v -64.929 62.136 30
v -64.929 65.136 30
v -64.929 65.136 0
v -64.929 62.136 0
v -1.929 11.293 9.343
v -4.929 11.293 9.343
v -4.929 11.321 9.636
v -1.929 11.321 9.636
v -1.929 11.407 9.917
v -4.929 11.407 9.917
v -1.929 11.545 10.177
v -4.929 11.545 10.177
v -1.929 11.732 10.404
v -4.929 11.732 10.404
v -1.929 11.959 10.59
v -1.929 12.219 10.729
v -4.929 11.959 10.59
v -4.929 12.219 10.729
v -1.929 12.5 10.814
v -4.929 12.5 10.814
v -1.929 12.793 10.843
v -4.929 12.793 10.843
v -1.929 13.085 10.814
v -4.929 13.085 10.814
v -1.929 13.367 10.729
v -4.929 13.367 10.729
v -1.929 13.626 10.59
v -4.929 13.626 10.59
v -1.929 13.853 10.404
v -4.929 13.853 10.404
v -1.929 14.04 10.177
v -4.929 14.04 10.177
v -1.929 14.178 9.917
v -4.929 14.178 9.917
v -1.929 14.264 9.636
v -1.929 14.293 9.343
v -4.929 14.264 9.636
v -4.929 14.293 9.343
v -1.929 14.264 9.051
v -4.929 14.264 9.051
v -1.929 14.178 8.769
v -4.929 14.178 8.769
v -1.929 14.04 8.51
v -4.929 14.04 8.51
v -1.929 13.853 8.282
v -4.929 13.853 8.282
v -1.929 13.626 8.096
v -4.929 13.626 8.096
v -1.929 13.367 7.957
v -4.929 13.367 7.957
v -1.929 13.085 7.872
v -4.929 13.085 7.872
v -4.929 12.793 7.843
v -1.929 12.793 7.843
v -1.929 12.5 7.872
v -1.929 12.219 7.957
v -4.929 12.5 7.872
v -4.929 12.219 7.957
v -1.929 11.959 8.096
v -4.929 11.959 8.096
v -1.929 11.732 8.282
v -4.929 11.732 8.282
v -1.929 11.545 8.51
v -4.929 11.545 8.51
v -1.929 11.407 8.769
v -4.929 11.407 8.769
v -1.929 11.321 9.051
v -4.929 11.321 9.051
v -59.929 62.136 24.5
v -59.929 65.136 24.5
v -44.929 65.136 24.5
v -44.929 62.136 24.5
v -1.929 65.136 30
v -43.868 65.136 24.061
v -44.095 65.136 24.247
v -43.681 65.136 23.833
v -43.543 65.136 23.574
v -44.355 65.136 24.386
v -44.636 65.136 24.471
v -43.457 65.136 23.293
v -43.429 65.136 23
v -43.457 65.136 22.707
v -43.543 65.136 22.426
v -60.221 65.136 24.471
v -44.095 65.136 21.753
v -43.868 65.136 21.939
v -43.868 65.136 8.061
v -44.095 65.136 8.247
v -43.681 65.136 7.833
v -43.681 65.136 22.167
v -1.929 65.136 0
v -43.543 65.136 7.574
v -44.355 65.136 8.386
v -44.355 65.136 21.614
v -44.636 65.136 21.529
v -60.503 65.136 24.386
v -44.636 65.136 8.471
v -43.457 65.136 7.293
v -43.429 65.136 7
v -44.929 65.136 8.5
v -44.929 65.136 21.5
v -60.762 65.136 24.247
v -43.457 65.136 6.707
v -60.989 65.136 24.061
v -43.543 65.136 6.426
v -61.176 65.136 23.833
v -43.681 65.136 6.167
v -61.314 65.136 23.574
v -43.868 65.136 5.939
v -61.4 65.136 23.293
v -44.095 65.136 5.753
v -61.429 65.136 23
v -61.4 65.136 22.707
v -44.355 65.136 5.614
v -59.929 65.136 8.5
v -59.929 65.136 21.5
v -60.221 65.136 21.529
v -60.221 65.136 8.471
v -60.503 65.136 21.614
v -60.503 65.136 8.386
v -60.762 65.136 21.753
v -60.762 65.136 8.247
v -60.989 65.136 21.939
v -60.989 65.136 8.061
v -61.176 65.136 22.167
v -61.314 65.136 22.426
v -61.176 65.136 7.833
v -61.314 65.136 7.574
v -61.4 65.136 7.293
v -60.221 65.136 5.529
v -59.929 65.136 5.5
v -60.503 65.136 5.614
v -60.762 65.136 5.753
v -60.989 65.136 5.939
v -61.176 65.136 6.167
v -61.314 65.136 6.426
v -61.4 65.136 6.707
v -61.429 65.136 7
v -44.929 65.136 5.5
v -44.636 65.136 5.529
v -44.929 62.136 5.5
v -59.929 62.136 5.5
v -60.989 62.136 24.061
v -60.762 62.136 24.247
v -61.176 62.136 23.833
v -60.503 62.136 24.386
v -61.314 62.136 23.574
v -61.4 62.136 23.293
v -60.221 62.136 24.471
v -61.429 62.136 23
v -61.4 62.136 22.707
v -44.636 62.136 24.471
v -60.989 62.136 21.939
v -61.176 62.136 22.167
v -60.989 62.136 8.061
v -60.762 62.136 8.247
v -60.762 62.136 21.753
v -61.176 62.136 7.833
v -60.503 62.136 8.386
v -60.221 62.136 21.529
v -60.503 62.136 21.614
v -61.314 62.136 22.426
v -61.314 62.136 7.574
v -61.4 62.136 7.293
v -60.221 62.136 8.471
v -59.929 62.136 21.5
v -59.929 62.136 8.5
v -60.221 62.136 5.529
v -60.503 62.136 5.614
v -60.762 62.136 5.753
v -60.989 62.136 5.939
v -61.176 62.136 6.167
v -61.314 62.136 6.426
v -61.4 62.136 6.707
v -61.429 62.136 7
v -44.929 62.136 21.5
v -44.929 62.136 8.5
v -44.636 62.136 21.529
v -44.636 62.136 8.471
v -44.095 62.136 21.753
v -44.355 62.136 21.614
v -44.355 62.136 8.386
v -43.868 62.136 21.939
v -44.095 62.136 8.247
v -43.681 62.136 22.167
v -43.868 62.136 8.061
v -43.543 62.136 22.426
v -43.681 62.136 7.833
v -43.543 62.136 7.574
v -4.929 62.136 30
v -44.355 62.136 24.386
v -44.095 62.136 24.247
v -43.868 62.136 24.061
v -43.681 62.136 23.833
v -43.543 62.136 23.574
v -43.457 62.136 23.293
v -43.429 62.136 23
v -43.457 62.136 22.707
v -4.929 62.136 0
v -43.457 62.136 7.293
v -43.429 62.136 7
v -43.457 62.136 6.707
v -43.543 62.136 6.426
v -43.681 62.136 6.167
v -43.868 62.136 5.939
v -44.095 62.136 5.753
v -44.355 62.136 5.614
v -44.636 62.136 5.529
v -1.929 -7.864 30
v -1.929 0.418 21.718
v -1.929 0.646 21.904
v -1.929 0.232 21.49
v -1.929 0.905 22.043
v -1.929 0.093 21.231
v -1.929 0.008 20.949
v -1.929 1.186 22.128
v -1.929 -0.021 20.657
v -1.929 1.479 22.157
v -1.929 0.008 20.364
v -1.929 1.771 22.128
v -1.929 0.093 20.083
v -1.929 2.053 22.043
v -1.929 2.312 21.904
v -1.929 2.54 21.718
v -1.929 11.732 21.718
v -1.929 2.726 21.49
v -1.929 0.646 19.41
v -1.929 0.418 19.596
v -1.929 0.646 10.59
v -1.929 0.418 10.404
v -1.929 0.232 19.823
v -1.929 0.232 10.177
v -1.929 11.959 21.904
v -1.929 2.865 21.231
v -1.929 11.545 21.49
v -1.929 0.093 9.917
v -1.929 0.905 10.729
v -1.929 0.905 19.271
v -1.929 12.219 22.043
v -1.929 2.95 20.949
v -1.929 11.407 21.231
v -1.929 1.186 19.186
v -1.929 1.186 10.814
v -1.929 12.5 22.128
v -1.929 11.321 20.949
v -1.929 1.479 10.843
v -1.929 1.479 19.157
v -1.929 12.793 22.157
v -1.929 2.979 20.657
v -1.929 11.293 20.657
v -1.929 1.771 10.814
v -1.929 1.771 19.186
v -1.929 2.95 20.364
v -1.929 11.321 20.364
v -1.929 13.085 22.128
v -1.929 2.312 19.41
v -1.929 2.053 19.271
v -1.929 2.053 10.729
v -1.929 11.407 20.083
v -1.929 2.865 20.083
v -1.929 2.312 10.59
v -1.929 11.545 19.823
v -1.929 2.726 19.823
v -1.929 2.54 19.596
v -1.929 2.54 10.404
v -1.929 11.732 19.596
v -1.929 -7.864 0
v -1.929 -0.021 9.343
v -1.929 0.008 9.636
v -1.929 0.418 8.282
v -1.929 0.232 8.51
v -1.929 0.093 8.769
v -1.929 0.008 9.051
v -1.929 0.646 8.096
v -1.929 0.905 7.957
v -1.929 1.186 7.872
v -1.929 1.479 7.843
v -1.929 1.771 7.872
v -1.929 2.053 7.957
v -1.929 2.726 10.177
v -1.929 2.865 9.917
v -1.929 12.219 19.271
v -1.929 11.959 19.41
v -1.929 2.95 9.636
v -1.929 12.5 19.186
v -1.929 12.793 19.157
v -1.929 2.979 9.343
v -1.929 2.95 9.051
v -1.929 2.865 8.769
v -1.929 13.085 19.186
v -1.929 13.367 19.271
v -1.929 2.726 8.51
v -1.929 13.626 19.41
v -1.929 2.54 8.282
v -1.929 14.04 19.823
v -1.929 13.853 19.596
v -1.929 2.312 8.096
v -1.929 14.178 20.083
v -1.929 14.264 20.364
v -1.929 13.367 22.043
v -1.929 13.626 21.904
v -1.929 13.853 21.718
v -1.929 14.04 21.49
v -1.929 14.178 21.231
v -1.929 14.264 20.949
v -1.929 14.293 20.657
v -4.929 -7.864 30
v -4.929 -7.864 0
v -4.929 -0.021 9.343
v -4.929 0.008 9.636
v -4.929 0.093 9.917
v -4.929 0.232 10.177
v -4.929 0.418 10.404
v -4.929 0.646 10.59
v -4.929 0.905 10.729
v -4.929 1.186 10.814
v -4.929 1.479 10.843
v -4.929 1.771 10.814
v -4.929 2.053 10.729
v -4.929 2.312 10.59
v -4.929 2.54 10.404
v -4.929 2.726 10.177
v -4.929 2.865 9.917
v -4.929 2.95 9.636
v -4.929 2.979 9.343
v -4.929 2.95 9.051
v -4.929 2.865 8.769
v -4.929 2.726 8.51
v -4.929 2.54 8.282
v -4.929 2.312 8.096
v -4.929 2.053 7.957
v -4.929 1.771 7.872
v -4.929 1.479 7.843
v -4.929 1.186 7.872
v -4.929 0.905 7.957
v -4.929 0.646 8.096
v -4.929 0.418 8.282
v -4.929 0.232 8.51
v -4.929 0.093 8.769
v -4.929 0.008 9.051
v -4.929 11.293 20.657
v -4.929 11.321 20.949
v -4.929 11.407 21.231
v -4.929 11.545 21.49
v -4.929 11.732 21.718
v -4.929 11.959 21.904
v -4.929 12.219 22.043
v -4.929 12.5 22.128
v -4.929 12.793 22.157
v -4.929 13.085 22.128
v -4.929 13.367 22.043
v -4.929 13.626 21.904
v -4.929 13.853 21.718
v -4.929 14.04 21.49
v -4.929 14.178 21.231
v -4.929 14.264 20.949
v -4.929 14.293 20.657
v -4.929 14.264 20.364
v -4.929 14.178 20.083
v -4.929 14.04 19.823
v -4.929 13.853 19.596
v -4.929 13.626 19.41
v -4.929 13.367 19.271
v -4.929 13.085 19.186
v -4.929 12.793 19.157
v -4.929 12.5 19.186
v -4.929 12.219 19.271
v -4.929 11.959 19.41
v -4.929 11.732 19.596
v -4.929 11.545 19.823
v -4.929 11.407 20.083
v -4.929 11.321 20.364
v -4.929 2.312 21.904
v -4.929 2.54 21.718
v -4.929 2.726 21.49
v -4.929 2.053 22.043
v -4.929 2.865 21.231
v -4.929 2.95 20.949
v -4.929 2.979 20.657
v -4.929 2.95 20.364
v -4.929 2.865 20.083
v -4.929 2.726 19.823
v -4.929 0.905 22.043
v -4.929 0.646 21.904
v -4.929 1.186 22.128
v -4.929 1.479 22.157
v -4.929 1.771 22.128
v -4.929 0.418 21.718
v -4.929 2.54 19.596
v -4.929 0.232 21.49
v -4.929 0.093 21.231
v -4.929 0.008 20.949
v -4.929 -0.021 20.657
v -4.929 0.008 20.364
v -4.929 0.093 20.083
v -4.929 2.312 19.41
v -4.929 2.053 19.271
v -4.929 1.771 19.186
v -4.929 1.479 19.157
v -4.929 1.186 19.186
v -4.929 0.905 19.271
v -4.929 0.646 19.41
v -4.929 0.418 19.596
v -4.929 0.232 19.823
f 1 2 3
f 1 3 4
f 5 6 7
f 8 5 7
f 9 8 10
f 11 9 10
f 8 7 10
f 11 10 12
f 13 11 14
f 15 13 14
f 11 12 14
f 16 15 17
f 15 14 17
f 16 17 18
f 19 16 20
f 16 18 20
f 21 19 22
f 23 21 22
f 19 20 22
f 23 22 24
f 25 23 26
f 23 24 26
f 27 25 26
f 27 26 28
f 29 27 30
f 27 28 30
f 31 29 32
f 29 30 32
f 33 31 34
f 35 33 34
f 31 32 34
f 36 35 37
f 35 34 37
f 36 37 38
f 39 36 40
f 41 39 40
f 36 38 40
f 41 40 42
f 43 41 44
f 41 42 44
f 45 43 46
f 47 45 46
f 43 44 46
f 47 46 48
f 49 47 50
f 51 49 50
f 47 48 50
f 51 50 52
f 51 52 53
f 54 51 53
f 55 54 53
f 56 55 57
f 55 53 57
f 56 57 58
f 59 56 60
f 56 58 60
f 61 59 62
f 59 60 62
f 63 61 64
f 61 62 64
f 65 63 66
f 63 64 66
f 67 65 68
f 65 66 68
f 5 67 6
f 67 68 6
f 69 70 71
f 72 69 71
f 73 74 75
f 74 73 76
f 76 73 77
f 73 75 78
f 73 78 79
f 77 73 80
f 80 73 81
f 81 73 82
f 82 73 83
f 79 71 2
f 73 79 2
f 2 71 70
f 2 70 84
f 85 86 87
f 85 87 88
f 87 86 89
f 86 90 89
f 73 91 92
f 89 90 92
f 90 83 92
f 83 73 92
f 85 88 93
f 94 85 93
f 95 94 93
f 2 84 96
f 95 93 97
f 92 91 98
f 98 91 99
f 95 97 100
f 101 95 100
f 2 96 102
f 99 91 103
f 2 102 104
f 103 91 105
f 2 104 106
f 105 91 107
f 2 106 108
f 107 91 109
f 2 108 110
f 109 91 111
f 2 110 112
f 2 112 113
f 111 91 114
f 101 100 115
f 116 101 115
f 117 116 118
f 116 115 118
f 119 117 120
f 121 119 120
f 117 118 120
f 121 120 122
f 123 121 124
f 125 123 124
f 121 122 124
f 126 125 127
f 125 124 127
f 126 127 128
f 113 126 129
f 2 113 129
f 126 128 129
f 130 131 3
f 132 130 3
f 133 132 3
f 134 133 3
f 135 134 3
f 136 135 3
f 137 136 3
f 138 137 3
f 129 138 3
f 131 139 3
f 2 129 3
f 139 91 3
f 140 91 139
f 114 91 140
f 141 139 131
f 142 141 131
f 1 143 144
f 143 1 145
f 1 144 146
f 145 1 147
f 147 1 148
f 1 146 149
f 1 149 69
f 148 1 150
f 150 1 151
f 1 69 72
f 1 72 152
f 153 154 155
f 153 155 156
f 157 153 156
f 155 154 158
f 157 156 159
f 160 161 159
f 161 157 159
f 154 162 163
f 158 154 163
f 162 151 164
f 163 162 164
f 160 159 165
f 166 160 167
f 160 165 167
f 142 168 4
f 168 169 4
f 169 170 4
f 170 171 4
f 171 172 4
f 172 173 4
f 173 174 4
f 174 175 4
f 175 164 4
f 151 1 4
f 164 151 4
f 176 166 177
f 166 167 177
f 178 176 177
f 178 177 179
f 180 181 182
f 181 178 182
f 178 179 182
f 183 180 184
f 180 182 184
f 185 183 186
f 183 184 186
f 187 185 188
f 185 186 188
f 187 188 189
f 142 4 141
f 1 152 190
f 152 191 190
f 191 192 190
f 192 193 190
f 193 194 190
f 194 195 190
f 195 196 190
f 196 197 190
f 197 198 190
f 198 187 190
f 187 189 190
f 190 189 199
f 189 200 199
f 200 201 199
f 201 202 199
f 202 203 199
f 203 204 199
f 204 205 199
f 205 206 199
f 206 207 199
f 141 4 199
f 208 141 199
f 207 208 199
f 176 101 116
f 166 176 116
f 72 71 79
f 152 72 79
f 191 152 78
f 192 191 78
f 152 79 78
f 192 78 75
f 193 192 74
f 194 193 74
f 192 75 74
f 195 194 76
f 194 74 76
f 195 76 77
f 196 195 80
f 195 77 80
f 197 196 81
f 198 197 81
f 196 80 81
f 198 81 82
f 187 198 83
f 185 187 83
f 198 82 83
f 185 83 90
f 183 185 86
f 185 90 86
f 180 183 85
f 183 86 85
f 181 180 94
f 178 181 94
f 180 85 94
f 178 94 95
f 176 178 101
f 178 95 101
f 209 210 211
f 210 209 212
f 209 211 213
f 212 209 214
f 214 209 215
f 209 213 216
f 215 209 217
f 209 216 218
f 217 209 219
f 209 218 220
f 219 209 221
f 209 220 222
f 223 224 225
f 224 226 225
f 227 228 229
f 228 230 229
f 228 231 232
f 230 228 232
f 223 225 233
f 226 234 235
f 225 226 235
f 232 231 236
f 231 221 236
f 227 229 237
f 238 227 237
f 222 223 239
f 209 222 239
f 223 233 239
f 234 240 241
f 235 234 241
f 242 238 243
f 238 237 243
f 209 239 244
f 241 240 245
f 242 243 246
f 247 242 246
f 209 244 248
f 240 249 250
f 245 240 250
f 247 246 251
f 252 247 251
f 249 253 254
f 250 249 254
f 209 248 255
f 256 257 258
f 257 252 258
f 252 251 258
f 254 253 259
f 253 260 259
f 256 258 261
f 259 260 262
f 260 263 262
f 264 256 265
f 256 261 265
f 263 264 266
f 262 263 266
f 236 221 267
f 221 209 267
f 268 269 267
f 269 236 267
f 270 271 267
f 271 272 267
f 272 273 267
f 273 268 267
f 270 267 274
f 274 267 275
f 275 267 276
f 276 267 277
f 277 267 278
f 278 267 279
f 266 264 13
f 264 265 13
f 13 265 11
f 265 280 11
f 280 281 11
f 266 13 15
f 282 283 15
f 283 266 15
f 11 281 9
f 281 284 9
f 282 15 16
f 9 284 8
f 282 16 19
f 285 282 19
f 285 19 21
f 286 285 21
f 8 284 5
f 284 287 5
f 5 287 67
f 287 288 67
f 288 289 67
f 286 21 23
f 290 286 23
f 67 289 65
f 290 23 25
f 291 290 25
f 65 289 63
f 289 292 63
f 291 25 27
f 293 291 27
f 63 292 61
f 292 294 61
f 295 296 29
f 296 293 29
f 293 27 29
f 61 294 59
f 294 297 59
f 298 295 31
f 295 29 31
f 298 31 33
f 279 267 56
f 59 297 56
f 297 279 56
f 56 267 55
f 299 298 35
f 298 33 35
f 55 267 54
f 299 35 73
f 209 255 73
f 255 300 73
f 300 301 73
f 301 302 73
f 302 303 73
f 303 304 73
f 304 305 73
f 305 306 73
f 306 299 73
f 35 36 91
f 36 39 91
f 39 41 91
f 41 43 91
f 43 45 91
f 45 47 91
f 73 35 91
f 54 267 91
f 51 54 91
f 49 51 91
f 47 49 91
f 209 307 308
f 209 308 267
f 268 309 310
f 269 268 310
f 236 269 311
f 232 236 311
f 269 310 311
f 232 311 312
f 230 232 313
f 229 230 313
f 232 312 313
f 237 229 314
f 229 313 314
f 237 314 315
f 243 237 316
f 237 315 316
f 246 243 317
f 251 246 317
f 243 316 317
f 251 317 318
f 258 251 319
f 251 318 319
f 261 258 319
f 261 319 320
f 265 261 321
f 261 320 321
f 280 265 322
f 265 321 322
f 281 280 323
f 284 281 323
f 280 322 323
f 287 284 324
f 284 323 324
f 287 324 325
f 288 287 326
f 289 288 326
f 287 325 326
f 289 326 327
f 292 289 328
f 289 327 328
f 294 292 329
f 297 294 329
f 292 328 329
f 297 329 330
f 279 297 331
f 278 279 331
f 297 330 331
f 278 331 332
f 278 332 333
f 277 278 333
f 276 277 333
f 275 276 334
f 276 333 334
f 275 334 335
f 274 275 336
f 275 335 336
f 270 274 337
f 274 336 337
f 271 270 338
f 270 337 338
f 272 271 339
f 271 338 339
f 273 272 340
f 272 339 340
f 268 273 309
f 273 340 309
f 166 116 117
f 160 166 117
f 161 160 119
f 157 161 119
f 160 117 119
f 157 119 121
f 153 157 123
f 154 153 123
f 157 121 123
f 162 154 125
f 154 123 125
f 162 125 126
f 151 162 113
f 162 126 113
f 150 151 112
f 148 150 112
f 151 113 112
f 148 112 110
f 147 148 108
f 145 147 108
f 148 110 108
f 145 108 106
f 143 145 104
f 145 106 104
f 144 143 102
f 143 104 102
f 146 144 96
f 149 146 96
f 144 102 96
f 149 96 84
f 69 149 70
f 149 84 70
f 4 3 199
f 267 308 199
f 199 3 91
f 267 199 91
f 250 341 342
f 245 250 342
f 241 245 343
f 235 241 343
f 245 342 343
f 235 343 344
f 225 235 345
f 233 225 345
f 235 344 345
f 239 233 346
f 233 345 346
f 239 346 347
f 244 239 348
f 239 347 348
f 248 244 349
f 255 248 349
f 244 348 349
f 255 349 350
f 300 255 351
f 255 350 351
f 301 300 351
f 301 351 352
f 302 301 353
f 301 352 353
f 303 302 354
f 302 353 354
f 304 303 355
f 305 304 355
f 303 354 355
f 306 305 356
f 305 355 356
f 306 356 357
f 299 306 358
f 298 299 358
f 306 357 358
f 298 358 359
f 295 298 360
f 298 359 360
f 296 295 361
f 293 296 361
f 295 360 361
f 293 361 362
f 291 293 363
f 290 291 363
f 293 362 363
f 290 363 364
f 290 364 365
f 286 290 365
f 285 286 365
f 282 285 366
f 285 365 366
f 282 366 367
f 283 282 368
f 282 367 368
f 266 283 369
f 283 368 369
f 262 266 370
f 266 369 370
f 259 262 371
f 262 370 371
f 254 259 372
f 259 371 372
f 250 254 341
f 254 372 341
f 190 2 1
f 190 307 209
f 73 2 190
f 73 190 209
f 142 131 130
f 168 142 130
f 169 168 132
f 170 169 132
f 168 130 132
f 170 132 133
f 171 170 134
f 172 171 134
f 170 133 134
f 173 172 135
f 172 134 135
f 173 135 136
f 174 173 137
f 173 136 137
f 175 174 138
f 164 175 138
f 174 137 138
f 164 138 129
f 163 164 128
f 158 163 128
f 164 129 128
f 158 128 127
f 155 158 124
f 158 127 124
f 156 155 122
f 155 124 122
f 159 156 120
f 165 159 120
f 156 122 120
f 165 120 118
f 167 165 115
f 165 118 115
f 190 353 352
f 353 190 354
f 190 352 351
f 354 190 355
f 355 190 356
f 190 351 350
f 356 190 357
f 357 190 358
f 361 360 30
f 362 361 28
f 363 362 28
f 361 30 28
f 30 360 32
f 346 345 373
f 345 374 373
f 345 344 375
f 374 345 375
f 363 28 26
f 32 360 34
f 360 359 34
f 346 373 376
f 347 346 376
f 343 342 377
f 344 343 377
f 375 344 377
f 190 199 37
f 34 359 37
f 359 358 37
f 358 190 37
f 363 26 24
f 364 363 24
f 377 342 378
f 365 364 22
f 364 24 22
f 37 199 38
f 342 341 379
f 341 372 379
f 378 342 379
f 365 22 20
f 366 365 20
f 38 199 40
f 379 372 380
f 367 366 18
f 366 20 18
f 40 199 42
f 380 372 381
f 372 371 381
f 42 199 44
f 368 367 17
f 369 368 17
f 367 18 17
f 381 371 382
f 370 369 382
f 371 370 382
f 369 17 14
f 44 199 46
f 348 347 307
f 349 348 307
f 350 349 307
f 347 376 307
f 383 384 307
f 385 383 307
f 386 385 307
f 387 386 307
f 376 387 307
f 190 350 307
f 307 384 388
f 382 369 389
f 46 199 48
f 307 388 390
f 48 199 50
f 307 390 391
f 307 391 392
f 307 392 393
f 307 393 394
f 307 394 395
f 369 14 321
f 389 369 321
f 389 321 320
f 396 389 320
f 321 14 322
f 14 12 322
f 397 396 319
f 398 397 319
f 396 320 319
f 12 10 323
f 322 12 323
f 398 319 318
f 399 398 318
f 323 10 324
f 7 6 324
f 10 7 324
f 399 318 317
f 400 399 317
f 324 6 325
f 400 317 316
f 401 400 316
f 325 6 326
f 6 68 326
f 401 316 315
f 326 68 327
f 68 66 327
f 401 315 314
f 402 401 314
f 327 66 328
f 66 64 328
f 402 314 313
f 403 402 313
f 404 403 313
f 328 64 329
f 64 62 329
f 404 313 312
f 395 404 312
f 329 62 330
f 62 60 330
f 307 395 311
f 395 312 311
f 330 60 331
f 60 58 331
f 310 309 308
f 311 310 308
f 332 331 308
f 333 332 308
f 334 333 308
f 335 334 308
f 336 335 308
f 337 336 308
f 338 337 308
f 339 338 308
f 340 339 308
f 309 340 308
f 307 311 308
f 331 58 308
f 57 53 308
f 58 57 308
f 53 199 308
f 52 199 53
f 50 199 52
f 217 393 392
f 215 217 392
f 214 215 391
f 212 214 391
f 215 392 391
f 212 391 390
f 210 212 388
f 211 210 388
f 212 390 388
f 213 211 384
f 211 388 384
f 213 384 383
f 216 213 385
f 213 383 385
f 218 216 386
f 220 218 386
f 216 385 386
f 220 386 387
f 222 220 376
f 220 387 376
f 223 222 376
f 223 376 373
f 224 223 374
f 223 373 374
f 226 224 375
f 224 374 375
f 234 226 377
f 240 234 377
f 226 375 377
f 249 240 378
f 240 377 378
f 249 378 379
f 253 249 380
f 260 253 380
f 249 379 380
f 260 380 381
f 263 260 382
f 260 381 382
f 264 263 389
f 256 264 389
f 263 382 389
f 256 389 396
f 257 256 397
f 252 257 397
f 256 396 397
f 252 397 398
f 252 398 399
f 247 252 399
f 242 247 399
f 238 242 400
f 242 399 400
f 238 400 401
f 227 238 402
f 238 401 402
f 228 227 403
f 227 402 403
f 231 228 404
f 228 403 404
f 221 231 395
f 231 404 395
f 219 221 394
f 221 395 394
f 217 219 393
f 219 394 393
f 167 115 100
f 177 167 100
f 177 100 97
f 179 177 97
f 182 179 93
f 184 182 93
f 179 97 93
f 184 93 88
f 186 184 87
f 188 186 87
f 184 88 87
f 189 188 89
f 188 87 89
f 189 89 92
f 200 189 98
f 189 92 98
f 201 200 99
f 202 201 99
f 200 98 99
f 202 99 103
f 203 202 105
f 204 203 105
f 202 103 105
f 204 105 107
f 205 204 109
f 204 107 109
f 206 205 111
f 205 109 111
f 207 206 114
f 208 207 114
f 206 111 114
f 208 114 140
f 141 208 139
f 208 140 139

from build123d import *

# Parameters (mm, degrees)
SALIENTE_EXTRUIR1_DEPTH = 30
CORTAR_EXTRUIR1_DEPTH   = 3
CROQUIS3_R              = 1.5
CORTAR_EXTRUIR2_DEPTH   = 3


with BuildPart() as part:
    # Croquis1 → Saliente-Extruir1 (new body)
    with BuildSketch(Plane.XY):
        Polygon((-64.928571429, 65.135714286), (-64.928571429, 62.135714286), (-4.928571429, 62.135714286), (-4.928571429, -7.864285714), (-1.928571429, -7.864285714), (-1.928571429, 65.135714286), align=None)
    extrude(amount=SALIENTE_EXTRUIR1_DEPTH)

    # Croquis2 → Cortar-Extruir1 (cut)
    with BuildSketch(Plane(origin=(0, 65.135714286, 0), x_dir=(1, 0, 0), z_dir=(0, 1, 0))):
        with BuildLine():
            Line((-59.928571429, -24.5), (-44.928571429, -24.5))
            ThreePointArc((-44.928571429, -24.5), (-43.428571429, -23), (-44.928571429, -21.5))
            Line((-44.928571429, -21.5), (-59.928571429, -21.5))
            ThreePointArc((-59.928571429, -21.5), (-61.428571429, -23), (-59.928571429, -24.5))
        make_face()
        with BuildLine():
            Line((-59.928571429, -8.5), (-44.928571429, -8.5))
            ThreePointArc((-44.928571429, -8.5), (-43.428571429, -7), (-44.928571429, -5.5))
            Line((-44.928571429, -5.5), (-59.928571429, -5.5))
            ThreePointArc((-59.928571429, -5.5), (-61.428571429, -7), (-59.928571429, -8.5))
        make_face()
    extrude(amount=-CORTAR_EXTRUIR1_DEPTH, mode=Mode.SUBTRACT)

    # Croquis3 → Cortar-Extruir2 (cut)
    with BuildSketch(Plane.ZY.offset(4.928571429)):
        with Locations(Location((20.656854249, 1.478860036, 0), (0, 0, 270))):
            Circle(CROQUIS3_R)
        with Locations(Location((9.343145751, 1.478860036, 0), (0, 0, 270))):
            Circle(CROQUIS3_R)
        with Locations(Location((9.343145751, 12.792568535, 0), (0, 0, 270))):
            Circle(CROQUIS3_R)
        with Locations(Location((20.656854249, 12.792568535, 0), (0, 0, 270))):
            Circle(CROQUIS3_R)
    extrude(amount=-CORTAR_EXTRUIR2_DEPTH, mode=Mode.SUBTRACT)


solid = part.part
